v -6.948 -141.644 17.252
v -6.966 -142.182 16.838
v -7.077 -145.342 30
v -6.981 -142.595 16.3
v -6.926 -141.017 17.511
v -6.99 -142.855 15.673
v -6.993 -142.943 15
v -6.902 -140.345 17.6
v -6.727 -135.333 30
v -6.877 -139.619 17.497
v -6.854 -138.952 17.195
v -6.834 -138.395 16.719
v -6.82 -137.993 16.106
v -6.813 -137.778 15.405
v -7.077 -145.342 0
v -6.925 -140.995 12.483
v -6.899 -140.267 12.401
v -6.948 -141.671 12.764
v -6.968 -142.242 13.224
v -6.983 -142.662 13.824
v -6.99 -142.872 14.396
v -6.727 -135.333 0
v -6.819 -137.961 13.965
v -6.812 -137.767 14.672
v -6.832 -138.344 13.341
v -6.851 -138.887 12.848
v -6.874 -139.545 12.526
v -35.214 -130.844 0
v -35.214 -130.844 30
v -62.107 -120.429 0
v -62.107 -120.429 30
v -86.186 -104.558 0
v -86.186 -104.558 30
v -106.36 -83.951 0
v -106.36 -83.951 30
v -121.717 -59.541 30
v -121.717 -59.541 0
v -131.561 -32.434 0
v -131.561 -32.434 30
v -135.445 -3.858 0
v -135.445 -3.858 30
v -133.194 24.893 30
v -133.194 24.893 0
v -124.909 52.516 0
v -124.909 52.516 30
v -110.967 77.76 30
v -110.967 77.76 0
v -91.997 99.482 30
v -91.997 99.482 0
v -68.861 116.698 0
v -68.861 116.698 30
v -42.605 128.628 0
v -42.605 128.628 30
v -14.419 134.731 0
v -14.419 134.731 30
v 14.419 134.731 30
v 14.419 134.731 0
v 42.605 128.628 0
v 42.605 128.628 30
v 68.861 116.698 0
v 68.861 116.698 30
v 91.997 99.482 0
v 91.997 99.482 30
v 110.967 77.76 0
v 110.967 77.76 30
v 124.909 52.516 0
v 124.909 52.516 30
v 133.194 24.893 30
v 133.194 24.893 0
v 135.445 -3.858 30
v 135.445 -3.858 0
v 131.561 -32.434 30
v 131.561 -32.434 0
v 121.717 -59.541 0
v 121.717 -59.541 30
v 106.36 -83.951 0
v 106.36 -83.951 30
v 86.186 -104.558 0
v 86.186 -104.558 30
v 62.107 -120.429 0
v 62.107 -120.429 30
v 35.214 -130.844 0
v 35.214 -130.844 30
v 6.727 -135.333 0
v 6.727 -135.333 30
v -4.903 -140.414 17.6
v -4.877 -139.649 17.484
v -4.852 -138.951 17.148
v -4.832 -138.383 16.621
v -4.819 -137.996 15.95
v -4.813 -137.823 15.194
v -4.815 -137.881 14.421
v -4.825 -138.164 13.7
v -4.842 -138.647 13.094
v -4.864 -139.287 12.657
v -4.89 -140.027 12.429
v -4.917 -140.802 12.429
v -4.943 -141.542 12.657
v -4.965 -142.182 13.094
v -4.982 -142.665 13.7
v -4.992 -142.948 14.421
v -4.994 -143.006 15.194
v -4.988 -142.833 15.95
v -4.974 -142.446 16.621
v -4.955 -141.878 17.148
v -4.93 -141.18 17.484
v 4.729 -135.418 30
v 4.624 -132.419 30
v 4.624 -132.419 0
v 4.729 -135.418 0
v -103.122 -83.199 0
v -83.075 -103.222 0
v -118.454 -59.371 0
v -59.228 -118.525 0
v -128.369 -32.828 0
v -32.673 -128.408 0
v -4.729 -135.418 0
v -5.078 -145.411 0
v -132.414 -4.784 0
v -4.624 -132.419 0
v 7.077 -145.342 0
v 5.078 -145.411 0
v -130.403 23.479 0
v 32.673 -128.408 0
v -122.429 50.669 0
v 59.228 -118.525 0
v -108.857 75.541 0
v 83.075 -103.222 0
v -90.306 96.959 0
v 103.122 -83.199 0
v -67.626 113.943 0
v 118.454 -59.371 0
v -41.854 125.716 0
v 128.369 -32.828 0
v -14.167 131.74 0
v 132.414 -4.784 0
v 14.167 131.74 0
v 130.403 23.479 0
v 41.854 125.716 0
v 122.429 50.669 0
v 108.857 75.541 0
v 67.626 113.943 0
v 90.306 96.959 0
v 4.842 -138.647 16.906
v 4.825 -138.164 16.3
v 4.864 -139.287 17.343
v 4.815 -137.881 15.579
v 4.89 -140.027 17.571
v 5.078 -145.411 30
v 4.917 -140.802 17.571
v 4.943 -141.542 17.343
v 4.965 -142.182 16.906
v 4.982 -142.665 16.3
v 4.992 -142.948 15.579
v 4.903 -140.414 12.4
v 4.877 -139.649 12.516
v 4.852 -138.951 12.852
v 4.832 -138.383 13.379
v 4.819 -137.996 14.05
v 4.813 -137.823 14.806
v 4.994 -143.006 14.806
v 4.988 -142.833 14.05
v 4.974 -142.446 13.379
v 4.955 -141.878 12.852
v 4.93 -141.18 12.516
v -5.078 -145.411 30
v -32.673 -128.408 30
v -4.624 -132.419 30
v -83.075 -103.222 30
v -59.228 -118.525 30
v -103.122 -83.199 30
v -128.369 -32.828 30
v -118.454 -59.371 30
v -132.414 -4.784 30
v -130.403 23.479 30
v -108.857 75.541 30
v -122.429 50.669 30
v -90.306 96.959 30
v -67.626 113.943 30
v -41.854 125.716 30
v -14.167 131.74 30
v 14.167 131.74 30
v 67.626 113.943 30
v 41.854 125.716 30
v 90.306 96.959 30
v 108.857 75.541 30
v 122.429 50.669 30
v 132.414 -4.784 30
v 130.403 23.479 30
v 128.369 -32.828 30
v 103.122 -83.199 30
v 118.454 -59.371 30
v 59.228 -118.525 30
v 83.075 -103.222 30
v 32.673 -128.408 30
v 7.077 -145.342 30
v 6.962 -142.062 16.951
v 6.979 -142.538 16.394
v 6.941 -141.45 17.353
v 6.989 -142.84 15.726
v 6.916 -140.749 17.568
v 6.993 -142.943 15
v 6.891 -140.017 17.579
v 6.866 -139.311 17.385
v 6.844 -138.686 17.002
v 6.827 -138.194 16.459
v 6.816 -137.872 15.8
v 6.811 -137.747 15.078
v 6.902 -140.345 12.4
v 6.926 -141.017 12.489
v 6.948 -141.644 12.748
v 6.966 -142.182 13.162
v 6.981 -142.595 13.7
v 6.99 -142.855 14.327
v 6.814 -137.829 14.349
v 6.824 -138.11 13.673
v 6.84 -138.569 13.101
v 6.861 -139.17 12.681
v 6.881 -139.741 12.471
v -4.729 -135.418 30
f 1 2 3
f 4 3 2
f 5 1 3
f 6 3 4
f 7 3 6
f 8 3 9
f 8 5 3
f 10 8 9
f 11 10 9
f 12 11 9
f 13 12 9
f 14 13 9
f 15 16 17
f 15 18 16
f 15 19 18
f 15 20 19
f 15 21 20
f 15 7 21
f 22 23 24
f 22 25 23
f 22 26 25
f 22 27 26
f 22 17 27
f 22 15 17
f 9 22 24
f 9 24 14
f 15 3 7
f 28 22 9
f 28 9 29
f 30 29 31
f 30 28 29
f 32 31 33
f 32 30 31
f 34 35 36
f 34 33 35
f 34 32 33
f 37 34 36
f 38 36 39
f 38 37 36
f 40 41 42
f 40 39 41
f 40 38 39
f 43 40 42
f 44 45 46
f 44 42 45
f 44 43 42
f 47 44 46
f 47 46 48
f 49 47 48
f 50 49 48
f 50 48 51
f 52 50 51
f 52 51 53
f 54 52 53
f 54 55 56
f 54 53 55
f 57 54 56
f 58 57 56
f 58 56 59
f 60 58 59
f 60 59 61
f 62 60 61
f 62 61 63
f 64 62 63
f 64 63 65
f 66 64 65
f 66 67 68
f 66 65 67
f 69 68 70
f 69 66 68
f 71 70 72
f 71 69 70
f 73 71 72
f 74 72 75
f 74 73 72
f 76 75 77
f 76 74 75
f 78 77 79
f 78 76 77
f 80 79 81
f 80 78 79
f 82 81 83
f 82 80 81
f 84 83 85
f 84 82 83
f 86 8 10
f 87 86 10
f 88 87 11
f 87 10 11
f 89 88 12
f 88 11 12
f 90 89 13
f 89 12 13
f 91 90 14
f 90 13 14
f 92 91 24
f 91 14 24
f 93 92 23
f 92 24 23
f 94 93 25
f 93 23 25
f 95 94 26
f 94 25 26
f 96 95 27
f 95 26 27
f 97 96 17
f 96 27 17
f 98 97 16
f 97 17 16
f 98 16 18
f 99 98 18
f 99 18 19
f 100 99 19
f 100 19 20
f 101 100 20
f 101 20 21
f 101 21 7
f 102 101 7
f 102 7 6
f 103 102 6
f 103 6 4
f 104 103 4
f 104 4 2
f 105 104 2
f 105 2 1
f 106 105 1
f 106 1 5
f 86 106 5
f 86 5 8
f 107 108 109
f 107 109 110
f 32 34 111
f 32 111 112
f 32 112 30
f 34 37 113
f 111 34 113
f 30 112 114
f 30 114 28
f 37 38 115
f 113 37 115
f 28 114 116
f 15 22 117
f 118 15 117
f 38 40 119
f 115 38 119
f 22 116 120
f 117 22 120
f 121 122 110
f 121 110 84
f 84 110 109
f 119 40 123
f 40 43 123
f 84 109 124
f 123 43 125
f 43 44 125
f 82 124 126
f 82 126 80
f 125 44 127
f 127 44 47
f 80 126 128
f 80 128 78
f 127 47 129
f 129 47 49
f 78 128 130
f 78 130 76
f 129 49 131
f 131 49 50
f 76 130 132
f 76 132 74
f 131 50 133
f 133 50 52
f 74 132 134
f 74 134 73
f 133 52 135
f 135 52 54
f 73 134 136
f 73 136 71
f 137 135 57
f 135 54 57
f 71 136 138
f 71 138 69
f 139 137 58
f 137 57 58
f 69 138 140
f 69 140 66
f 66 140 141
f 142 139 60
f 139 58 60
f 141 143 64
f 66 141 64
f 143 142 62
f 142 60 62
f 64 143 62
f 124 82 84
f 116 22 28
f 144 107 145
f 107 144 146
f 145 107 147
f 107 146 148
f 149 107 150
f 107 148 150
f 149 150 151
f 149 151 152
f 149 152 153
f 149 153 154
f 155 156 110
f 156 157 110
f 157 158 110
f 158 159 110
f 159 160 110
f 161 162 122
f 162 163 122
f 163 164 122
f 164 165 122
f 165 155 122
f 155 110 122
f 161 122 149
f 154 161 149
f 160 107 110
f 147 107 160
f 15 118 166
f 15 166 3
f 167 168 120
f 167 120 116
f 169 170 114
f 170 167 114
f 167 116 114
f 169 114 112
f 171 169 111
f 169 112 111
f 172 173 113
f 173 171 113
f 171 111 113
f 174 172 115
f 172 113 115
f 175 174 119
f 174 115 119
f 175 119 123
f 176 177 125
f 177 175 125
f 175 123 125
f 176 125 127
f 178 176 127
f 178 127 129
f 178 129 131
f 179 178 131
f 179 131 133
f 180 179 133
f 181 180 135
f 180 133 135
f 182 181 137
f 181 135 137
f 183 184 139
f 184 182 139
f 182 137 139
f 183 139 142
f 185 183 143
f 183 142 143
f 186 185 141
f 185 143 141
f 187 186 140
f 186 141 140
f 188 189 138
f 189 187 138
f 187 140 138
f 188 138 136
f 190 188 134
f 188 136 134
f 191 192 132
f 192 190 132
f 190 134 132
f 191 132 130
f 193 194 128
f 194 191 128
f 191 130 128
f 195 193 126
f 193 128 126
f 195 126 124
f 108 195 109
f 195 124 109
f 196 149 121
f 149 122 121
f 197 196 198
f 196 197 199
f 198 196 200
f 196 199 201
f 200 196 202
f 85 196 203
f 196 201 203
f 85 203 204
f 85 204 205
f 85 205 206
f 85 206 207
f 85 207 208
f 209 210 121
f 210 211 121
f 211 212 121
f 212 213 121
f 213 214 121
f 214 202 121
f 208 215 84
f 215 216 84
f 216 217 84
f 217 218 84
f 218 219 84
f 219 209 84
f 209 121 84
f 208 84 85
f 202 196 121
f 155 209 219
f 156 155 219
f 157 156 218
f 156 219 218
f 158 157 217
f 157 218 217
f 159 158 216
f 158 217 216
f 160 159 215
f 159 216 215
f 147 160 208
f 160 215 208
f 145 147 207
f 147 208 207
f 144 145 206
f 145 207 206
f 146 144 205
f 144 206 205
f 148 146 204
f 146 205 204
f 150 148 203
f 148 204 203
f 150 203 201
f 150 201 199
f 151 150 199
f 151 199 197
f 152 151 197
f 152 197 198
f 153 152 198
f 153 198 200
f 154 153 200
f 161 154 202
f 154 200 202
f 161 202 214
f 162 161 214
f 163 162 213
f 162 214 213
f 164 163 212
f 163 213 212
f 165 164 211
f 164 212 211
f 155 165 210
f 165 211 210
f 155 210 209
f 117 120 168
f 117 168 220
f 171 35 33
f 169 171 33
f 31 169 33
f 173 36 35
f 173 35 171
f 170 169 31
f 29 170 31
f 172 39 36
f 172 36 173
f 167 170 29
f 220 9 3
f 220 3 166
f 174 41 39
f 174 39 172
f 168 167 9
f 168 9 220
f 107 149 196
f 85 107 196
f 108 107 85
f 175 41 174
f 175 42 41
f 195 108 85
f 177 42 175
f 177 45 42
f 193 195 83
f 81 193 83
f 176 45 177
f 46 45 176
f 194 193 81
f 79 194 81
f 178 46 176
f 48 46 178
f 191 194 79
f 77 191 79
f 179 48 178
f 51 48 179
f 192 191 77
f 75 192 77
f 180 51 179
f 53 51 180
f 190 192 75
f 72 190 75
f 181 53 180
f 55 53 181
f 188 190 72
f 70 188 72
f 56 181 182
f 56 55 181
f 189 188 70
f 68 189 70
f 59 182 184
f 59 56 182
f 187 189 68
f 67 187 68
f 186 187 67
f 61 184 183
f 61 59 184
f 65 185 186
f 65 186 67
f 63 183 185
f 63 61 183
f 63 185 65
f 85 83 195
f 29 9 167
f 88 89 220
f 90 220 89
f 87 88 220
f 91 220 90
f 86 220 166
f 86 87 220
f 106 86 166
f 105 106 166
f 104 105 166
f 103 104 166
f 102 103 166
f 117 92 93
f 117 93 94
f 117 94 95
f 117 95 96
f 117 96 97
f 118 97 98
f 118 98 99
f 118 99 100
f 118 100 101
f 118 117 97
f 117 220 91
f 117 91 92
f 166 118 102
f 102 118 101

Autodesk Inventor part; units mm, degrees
ref_plane "YZ Plane" through (0, 0, 0) normal (1, 0, 0) x (0, 1, 0)
ref_plane "XZ Plane" through (0, 0, 0) normal (0, 1, 0) x (-1, 0, 0)
ref_plane "XY Plane" through (0, 0, 0) normal (0, 0, 1) x (1, 0, 0)
sketch "스케치1" plane through (0, 0, 0) normal (0, 0, 1) x (1, 0, 0)
  arc A0 (4.6242, -132.4193) -> (-4.6242, -132.4193) centre (0, 0) ccw
  arc A1 (4.7289, -135.4175) -> (-4.7289, -135.4175) centre (0, 0) ccw
  line L0 (0, 0) -> (-4.7289, -135.4175)
  line L1 (0, 0) -> (135.5, 0) construction
  line L2 (0, 0) -> (4.7289, -135.4175)
  line L3 (0, 0) -> (135.5, 0) construction
  line L4 (-4.7289, -135.4175) -> (-5.0779, -145.4114)
  line L5 (-5.0779, -145.4114) -> (-7.0767, -145.3416)
  line L6 (-7.0767, -145.3416) -> (-6.7271, -135.3329)
  line L7 (4.7289, -135.4175) -> (5.0779, -145.4114)
  line L8 (4.7289, -135.4175) -> (14.7289, -135.4175) construction
  line L9 (5.0779, -145.4114) -> (7.0767, -145.3416)
  line L10 (7.0767, -145.3416) -> (6.7271, -135.3329)
  dimension "d0" = 265
  dimension "d1" = 3
  dimension "d2" = 92
  dimension "d3" = 88
  dimension "d4" = 10
  dimension "d5" = 2
  dimension "d6" = 90
  dimension "d7" = 90
  dimension "d8" = 10
  dimension "d9" = 88
  dimension "d10" = 2
  dimension "d11" = 90
  dimension "d12" = 90
extrude "돌출1" add sketch "스케치1" along normal blind 30 contours A0 L0 A1 L2 | A1 L10 L9 L7 | L4 L5 L6 A1
sketch "스케치2" plane through (6.7271, -135.3329, 30) normal (0.9994, 0.0349, 0) x (0, 0, -1)
  line L0 (30, -10.0148) -> (0, -10.0148) projected
  line L1 (15, -10.0148) -> (15, -5.0148)
  circle A0 centre (15, -5.0148) radius 2.6
  point P0 (30, 135.4852)
  dimension "d15" = 5
  dimension "d16" = 5.2
extrude "돌출2" cut sketch "스케치2" against normal up to surface (2 mm away)
sketch "스케치3" plane through (-7.0767, -145.3416, 0) normal (-0.9994, 0.0349, 0) x (0, 0, 1)
  line L0 (0, 0) -> (30, 0) projected
  line L1 (15, 0) -> (15, 5)
  line L2 (15, 0) -> (20, 0) construction
  circle A0 centre (15, 5) radius 2.6
  point P0 (0, 145.5)
  dimension "d19" = 5
  dimension "d20" = 90
  dimension "d21" = 5.2
extrude "돌출3" cut sketch "스케치3" against normal up to surface (2 mm away)
properties part number "camera_robotarm"
